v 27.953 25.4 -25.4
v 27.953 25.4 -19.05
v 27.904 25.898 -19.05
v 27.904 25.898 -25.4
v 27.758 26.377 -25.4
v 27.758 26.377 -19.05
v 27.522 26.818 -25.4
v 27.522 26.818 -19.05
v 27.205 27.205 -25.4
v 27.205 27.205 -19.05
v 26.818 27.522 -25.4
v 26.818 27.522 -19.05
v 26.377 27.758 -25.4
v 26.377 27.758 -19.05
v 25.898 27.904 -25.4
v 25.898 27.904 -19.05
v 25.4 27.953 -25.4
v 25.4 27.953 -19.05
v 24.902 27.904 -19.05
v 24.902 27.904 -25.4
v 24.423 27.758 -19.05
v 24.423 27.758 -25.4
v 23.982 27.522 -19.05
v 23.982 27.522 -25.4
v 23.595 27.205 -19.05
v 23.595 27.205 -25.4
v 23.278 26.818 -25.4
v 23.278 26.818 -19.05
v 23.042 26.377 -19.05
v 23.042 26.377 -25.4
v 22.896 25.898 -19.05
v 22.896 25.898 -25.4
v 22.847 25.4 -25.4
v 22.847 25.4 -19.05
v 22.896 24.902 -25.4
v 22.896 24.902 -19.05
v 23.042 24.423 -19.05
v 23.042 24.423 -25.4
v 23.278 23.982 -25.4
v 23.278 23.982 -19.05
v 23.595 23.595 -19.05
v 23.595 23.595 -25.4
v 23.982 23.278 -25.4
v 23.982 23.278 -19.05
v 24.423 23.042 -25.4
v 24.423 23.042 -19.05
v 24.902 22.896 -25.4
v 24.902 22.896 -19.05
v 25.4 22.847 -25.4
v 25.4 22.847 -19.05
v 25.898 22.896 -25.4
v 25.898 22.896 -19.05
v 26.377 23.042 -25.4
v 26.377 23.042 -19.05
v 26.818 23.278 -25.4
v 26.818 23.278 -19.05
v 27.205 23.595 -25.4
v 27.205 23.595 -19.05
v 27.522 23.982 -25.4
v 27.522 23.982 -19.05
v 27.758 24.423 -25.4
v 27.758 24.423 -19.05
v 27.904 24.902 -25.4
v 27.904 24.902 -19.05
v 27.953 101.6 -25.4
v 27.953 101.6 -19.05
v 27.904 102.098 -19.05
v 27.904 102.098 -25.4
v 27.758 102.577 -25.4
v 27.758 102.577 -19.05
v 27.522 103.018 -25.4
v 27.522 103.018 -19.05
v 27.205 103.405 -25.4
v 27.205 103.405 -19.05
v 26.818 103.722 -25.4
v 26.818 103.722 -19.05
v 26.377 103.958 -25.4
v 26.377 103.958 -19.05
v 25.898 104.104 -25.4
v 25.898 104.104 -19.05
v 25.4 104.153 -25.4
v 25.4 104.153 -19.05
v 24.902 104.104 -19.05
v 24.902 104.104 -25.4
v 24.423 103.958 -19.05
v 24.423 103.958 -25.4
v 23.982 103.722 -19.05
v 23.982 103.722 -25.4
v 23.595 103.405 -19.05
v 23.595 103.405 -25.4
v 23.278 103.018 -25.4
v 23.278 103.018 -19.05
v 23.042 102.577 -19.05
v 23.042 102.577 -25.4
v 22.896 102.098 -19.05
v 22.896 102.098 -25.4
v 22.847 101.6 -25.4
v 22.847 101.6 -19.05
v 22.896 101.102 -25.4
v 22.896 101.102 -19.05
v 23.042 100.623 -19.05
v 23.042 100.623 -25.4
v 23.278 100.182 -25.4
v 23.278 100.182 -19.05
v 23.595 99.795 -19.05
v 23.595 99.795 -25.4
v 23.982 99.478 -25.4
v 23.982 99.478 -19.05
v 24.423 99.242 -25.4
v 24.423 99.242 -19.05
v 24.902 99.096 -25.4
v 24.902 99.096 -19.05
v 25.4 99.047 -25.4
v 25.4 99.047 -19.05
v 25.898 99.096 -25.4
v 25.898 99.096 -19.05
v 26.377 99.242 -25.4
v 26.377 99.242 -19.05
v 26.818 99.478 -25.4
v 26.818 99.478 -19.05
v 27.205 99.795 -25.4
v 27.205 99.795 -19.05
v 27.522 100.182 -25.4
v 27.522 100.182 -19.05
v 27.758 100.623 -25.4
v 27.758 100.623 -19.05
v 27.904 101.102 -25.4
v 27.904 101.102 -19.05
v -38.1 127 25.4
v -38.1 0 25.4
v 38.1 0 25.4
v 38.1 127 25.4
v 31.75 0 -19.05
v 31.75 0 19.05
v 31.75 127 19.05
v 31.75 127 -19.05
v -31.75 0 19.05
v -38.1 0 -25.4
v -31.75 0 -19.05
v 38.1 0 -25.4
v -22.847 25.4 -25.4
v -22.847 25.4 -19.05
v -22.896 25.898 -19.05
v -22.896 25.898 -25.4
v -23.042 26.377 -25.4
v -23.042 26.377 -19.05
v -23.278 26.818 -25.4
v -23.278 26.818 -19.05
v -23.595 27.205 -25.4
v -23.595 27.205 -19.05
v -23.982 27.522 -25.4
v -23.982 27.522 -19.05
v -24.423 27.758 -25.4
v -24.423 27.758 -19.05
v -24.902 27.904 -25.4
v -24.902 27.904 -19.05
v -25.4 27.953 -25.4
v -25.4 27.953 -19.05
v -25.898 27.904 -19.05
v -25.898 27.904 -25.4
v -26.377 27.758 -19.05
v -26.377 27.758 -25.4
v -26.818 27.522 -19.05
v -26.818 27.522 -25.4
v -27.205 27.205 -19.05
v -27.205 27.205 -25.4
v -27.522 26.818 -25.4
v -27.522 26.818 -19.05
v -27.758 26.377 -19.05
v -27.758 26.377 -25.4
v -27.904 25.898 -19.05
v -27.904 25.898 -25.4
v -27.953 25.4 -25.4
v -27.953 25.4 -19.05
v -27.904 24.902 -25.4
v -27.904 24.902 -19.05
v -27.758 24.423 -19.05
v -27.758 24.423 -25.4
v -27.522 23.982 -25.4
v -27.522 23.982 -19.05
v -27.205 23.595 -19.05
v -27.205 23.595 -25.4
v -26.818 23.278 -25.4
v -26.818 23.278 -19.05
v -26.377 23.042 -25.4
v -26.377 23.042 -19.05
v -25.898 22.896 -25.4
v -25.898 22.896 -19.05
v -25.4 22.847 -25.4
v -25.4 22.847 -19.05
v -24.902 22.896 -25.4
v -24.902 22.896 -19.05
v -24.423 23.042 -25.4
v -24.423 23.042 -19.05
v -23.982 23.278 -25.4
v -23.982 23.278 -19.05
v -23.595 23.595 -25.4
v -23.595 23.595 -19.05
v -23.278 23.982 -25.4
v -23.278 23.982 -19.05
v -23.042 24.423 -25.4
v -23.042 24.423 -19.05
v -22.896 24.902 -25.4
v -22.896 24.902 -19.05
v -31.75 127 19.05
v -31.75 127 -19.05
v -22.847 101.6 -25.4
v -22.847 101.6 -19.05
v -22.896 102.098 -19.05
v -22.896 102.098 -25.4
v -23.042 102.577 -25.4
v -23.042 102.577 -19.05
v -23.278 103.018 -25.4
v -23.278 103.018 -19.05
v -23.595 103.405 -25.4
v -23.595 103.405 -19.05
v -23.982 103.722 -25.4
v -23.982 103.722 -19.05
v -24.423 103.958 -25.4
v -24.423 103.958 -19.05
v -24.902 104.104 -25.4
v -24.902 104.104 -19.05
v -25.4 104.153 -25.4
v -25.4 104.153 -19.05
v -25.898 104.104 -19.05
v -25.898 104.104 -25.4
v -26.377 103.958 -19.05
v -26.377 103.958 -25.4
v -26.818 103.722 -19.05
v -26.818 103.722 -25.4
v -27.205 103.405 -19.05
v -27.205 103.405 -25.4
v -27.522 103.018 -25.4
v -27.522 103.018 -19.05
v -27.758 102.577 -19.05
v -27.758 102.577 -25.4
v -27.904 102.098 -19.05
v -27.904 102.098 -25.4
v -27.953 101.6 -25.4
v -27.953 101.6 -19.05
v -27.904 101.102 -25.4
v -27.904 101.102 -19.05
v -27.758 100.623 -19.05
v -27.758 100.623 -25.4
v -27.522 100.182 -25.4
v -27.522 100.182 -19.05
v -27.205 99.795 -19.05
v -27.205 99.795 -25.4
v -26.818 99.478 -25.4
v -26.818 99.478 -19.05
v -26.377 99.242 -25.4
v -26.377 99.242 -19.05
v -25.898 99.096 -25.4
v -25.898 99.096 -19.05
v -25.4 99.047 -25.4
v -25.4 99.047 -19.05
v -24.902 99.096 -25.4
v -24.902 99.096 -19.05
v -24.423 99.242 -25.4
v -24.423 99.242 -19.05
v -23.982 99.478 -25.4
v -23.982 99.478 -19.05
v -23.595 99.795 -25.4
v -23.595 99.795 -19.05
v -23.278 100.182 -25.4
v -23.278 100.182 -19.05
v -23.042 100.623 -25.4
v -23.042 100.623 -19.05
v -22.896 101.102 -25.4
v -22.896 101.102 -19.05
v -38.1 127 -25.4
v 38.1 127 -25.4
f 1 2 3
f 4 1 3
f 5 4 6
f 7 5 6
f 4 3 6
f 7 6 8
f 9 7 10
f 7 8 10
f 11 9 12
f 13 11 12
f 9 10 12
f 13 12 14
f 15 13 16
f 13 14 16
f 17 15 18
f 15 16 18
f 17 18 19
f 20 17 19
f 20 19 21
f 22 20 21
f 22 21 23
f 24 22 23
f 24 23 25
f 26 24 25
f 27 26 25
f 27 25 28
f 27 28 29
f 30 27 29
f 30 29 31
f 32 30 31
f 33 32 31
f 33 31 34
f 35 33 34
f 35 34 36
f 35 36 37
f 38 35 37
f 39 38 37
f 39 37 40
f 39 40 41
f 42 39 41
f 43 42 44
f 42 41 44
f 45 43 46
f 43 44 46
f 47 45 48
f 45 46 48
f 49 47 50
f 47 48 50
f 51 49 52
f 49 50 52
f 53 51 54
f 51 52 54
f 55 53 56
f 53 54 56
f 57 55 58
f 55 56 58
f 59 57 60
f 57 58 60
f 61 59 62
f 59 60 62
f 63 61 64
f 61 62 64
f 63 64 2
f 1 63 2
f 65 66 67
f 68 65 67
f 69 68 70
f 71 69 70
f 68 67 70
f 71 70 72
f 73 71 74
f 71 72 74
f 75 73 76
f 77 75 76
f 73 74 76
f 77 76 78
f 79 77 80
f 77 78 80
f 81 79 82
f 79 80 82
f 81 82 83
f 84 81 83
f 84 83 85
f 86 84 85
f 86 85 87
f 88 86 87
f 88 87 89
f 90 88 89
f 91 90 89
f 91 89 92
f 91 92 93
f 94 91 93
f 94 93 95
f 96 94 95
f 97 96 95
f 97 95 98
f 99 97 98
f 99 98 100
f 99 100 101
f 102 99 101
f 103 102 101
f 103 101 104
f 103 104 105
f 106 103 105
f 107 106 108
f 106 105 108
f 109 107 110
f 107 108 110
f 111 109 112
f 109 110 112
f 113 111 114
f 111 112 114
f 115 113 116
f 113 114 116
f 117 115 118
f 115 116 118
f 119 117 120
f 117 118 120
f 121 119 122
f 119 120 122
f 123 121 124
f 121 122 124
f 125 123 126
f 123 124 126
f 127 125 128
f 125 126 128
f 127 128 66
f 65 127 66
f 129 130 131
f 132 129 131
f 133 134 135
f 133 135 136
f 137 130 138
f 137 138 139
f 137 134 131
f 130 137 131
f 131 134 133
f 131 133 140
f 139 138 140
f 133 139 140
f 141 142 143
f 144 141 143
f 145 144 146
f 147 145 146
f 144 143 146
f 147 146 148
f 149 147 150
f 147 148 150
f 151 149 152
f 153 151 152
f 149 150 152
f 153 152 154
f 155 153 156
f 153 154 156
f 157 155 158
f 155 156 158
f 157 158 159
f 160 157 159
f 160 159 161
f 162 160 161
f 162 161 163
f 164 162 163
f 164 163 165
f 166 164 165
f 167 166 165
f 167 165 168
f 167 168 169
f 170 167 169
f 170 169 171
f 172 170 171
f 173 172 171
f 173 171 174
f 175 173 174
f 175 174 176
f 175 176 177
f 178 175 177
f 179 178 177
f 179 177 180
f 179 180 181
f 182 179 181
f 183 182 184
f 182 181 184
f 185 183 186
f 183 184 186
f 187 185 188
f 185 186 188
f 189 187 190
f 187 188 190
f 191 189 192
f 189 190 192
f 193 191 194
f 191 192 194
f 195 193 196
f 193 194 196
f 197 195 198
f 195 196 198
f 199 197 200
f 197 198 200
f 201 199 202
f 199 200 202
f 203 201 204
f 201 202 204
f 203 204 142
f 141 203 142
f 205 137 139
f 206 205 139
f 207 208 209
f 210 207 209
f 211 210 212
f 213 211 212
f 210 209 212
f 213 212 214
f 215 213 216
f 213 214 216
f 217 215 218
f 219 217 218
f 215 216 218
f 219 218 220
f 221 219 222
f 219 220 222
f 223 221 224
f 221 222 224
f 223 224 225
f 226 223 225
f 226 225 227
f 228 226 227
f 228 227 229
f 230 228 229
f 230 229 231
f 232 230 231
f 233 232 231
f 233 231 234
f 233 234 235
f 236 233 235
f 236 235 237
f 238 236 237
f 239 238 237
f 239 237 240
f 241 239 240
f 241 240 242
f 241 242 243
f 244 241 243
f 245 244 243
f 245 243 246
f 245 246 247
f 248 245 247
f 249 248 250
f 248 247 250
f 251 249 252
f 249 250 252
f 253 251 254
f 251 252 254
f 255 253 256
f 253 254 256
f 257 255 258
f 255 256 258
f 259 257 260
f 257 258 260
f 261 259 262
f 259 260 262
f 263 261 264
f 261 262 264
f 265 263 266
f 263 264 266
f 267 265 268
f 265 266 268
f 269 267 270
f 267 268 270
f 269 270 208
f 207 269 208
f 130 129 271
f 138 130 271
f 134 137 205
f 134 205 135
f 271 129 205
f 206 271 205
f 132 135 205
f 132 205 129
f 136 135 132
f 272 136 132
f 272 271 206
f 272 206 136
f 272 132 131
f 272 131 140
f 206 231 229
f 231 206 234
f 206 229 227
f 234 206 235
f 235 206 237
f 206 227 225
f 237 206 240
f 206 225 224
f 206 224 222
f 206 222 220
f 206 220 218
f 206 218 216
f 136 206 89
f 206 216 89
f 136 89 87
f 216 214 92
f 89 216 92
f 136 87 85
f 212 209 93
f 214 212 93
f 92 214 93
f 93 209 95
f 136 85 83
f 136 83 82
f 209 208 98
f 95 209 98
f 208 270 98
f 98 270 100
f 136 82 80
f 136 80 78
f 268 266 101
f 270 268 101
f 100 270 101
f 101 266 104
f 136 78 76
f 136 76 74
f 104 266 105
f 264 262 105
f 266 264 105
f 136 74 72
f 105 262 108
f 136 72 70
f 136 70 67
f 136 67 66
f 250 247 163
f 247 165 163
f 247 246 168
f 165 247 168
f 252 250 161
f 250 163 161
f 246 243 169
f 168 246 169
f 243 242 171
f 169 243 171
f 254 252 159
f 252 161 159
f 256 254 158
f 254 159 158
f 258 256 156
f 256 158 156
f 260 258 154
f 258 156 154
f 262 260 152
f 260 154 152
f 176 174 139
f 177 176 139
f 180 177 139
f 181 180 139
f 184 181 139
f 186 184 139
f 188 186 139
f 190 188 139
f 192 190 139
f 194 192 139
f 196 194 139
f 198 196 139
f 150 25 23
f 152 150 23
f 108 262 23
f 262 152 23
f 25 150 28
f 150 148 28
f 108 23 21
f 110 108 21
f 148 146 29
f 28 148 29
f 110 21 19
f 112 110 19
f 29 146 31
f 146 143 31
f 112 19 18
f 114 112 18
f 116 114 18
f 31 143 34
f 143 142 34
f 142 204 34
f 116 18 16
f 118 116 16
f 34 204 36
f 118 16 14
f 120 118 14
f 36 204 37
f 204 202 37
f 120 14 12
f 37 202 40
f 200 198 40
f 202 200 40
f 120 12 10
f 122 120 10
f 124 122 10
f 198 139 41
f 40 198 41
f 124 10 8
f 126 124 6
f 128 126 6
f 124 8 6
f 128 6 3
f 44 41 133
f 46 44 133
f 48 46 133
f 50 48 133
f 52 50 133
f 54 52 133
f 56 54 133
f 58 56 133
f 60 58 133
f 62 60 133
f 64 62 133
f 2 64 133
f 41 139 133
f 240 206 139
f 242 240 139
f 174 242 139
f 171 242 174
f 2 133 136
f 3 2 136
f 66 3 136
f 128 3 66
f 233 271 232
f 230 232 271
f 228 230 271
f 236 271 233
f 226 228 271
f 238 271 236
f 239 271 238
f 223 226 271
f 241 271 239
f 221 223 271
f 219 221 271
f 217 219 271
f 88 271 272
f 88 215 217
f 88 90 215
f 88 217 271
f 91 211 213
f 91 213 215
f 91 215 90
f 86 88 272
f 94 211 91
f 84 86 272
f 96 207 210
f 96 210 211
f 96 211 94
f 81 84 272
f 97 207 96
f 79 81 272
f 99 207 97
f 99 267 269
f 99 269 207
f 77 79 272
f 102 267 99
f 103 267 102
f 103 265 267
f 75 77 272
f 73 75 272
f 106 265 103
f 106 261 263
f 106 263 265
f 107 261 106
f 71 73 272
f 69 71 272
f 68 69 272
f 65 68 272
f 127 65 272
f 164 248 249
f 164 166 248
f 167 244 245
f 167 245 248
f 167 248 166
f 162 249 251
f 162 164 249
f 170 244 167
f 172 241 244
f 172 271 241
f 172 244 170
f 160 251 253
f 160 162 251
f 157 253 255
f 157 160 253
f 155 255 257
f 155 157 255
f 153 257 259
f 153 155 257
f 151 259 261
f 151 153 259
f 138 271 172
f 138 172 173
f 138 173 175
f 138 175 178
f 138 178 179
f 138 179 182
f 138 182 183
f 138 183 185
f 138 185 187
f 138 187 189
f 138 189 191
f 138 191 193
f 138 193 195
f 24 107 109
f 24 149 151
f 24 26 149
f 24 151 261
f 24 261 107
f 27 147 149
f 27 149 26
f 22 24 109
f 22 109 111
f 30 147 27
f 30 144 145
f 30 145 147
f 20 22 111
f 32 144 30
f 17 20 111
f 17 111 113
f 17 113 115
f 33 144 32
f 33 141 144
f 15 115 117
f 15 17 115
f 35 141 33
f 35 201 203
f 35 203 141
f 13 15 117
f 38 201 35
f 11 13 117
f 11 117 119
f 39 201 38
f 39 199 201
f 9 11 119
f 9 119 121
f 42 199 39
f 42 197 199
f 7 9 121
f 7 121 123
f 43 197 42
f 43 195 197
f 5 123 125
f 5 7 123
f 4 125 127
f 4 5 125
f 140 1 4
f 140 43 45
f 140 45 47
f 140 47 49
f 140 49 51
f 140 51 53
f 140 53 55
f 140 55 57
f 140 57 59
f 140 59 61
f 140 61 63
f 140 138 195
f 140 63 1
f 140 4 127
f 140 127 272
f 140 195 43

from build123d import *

# Parameters (mm, degrees)
SKETCH1_W                   = 76.2
SKETCH1_H                   = 50.8
SKETCH1_W_2                 = 63.5
SKETCH1_H_2                 = 38.1
BOSS_EXTRUDE1_DEPTH         = 127
F_1_4_20_TAPPED_HOLE1_D     = 5.1054
F_1_4_20_TAPPED_HOLE1_DEPTH = 6.35


with BuildPart() as part:
    # Sketch1 → Boss-Extrude1 (new body)
    with BuildSketch(Plane(origin=(0, 0, 0), x_dir=(1, 0, 0), z_dir=(0, 1, 0))):
        Rectangle(SKETCH1_W, SKETCH1_H)
        Rectangle(SKETCH1_W_2, SKETCH1_H_2, mode=Mode.SUBTRACT)
    extrude(amount=BOSS_EXTRUDE1_DEPTH)

    # 1/4-20 Tapped Hole1
    with Locations(Plane(origin=(0, 0, -25.4), x_dir=(-1, 0, 0), z_dir=(0, 0, -1))):
        with Locations((-25.4, 101.6), (-25.4, 25.4), (25.4, 25.4), (25.4, 101.6)):
            Hole(F_1_4_20_TAPPED_HOLE1_D / 2, depth=F_1_4_20_TAPPED_HOLE1_DEPTH)


solid = part.part
